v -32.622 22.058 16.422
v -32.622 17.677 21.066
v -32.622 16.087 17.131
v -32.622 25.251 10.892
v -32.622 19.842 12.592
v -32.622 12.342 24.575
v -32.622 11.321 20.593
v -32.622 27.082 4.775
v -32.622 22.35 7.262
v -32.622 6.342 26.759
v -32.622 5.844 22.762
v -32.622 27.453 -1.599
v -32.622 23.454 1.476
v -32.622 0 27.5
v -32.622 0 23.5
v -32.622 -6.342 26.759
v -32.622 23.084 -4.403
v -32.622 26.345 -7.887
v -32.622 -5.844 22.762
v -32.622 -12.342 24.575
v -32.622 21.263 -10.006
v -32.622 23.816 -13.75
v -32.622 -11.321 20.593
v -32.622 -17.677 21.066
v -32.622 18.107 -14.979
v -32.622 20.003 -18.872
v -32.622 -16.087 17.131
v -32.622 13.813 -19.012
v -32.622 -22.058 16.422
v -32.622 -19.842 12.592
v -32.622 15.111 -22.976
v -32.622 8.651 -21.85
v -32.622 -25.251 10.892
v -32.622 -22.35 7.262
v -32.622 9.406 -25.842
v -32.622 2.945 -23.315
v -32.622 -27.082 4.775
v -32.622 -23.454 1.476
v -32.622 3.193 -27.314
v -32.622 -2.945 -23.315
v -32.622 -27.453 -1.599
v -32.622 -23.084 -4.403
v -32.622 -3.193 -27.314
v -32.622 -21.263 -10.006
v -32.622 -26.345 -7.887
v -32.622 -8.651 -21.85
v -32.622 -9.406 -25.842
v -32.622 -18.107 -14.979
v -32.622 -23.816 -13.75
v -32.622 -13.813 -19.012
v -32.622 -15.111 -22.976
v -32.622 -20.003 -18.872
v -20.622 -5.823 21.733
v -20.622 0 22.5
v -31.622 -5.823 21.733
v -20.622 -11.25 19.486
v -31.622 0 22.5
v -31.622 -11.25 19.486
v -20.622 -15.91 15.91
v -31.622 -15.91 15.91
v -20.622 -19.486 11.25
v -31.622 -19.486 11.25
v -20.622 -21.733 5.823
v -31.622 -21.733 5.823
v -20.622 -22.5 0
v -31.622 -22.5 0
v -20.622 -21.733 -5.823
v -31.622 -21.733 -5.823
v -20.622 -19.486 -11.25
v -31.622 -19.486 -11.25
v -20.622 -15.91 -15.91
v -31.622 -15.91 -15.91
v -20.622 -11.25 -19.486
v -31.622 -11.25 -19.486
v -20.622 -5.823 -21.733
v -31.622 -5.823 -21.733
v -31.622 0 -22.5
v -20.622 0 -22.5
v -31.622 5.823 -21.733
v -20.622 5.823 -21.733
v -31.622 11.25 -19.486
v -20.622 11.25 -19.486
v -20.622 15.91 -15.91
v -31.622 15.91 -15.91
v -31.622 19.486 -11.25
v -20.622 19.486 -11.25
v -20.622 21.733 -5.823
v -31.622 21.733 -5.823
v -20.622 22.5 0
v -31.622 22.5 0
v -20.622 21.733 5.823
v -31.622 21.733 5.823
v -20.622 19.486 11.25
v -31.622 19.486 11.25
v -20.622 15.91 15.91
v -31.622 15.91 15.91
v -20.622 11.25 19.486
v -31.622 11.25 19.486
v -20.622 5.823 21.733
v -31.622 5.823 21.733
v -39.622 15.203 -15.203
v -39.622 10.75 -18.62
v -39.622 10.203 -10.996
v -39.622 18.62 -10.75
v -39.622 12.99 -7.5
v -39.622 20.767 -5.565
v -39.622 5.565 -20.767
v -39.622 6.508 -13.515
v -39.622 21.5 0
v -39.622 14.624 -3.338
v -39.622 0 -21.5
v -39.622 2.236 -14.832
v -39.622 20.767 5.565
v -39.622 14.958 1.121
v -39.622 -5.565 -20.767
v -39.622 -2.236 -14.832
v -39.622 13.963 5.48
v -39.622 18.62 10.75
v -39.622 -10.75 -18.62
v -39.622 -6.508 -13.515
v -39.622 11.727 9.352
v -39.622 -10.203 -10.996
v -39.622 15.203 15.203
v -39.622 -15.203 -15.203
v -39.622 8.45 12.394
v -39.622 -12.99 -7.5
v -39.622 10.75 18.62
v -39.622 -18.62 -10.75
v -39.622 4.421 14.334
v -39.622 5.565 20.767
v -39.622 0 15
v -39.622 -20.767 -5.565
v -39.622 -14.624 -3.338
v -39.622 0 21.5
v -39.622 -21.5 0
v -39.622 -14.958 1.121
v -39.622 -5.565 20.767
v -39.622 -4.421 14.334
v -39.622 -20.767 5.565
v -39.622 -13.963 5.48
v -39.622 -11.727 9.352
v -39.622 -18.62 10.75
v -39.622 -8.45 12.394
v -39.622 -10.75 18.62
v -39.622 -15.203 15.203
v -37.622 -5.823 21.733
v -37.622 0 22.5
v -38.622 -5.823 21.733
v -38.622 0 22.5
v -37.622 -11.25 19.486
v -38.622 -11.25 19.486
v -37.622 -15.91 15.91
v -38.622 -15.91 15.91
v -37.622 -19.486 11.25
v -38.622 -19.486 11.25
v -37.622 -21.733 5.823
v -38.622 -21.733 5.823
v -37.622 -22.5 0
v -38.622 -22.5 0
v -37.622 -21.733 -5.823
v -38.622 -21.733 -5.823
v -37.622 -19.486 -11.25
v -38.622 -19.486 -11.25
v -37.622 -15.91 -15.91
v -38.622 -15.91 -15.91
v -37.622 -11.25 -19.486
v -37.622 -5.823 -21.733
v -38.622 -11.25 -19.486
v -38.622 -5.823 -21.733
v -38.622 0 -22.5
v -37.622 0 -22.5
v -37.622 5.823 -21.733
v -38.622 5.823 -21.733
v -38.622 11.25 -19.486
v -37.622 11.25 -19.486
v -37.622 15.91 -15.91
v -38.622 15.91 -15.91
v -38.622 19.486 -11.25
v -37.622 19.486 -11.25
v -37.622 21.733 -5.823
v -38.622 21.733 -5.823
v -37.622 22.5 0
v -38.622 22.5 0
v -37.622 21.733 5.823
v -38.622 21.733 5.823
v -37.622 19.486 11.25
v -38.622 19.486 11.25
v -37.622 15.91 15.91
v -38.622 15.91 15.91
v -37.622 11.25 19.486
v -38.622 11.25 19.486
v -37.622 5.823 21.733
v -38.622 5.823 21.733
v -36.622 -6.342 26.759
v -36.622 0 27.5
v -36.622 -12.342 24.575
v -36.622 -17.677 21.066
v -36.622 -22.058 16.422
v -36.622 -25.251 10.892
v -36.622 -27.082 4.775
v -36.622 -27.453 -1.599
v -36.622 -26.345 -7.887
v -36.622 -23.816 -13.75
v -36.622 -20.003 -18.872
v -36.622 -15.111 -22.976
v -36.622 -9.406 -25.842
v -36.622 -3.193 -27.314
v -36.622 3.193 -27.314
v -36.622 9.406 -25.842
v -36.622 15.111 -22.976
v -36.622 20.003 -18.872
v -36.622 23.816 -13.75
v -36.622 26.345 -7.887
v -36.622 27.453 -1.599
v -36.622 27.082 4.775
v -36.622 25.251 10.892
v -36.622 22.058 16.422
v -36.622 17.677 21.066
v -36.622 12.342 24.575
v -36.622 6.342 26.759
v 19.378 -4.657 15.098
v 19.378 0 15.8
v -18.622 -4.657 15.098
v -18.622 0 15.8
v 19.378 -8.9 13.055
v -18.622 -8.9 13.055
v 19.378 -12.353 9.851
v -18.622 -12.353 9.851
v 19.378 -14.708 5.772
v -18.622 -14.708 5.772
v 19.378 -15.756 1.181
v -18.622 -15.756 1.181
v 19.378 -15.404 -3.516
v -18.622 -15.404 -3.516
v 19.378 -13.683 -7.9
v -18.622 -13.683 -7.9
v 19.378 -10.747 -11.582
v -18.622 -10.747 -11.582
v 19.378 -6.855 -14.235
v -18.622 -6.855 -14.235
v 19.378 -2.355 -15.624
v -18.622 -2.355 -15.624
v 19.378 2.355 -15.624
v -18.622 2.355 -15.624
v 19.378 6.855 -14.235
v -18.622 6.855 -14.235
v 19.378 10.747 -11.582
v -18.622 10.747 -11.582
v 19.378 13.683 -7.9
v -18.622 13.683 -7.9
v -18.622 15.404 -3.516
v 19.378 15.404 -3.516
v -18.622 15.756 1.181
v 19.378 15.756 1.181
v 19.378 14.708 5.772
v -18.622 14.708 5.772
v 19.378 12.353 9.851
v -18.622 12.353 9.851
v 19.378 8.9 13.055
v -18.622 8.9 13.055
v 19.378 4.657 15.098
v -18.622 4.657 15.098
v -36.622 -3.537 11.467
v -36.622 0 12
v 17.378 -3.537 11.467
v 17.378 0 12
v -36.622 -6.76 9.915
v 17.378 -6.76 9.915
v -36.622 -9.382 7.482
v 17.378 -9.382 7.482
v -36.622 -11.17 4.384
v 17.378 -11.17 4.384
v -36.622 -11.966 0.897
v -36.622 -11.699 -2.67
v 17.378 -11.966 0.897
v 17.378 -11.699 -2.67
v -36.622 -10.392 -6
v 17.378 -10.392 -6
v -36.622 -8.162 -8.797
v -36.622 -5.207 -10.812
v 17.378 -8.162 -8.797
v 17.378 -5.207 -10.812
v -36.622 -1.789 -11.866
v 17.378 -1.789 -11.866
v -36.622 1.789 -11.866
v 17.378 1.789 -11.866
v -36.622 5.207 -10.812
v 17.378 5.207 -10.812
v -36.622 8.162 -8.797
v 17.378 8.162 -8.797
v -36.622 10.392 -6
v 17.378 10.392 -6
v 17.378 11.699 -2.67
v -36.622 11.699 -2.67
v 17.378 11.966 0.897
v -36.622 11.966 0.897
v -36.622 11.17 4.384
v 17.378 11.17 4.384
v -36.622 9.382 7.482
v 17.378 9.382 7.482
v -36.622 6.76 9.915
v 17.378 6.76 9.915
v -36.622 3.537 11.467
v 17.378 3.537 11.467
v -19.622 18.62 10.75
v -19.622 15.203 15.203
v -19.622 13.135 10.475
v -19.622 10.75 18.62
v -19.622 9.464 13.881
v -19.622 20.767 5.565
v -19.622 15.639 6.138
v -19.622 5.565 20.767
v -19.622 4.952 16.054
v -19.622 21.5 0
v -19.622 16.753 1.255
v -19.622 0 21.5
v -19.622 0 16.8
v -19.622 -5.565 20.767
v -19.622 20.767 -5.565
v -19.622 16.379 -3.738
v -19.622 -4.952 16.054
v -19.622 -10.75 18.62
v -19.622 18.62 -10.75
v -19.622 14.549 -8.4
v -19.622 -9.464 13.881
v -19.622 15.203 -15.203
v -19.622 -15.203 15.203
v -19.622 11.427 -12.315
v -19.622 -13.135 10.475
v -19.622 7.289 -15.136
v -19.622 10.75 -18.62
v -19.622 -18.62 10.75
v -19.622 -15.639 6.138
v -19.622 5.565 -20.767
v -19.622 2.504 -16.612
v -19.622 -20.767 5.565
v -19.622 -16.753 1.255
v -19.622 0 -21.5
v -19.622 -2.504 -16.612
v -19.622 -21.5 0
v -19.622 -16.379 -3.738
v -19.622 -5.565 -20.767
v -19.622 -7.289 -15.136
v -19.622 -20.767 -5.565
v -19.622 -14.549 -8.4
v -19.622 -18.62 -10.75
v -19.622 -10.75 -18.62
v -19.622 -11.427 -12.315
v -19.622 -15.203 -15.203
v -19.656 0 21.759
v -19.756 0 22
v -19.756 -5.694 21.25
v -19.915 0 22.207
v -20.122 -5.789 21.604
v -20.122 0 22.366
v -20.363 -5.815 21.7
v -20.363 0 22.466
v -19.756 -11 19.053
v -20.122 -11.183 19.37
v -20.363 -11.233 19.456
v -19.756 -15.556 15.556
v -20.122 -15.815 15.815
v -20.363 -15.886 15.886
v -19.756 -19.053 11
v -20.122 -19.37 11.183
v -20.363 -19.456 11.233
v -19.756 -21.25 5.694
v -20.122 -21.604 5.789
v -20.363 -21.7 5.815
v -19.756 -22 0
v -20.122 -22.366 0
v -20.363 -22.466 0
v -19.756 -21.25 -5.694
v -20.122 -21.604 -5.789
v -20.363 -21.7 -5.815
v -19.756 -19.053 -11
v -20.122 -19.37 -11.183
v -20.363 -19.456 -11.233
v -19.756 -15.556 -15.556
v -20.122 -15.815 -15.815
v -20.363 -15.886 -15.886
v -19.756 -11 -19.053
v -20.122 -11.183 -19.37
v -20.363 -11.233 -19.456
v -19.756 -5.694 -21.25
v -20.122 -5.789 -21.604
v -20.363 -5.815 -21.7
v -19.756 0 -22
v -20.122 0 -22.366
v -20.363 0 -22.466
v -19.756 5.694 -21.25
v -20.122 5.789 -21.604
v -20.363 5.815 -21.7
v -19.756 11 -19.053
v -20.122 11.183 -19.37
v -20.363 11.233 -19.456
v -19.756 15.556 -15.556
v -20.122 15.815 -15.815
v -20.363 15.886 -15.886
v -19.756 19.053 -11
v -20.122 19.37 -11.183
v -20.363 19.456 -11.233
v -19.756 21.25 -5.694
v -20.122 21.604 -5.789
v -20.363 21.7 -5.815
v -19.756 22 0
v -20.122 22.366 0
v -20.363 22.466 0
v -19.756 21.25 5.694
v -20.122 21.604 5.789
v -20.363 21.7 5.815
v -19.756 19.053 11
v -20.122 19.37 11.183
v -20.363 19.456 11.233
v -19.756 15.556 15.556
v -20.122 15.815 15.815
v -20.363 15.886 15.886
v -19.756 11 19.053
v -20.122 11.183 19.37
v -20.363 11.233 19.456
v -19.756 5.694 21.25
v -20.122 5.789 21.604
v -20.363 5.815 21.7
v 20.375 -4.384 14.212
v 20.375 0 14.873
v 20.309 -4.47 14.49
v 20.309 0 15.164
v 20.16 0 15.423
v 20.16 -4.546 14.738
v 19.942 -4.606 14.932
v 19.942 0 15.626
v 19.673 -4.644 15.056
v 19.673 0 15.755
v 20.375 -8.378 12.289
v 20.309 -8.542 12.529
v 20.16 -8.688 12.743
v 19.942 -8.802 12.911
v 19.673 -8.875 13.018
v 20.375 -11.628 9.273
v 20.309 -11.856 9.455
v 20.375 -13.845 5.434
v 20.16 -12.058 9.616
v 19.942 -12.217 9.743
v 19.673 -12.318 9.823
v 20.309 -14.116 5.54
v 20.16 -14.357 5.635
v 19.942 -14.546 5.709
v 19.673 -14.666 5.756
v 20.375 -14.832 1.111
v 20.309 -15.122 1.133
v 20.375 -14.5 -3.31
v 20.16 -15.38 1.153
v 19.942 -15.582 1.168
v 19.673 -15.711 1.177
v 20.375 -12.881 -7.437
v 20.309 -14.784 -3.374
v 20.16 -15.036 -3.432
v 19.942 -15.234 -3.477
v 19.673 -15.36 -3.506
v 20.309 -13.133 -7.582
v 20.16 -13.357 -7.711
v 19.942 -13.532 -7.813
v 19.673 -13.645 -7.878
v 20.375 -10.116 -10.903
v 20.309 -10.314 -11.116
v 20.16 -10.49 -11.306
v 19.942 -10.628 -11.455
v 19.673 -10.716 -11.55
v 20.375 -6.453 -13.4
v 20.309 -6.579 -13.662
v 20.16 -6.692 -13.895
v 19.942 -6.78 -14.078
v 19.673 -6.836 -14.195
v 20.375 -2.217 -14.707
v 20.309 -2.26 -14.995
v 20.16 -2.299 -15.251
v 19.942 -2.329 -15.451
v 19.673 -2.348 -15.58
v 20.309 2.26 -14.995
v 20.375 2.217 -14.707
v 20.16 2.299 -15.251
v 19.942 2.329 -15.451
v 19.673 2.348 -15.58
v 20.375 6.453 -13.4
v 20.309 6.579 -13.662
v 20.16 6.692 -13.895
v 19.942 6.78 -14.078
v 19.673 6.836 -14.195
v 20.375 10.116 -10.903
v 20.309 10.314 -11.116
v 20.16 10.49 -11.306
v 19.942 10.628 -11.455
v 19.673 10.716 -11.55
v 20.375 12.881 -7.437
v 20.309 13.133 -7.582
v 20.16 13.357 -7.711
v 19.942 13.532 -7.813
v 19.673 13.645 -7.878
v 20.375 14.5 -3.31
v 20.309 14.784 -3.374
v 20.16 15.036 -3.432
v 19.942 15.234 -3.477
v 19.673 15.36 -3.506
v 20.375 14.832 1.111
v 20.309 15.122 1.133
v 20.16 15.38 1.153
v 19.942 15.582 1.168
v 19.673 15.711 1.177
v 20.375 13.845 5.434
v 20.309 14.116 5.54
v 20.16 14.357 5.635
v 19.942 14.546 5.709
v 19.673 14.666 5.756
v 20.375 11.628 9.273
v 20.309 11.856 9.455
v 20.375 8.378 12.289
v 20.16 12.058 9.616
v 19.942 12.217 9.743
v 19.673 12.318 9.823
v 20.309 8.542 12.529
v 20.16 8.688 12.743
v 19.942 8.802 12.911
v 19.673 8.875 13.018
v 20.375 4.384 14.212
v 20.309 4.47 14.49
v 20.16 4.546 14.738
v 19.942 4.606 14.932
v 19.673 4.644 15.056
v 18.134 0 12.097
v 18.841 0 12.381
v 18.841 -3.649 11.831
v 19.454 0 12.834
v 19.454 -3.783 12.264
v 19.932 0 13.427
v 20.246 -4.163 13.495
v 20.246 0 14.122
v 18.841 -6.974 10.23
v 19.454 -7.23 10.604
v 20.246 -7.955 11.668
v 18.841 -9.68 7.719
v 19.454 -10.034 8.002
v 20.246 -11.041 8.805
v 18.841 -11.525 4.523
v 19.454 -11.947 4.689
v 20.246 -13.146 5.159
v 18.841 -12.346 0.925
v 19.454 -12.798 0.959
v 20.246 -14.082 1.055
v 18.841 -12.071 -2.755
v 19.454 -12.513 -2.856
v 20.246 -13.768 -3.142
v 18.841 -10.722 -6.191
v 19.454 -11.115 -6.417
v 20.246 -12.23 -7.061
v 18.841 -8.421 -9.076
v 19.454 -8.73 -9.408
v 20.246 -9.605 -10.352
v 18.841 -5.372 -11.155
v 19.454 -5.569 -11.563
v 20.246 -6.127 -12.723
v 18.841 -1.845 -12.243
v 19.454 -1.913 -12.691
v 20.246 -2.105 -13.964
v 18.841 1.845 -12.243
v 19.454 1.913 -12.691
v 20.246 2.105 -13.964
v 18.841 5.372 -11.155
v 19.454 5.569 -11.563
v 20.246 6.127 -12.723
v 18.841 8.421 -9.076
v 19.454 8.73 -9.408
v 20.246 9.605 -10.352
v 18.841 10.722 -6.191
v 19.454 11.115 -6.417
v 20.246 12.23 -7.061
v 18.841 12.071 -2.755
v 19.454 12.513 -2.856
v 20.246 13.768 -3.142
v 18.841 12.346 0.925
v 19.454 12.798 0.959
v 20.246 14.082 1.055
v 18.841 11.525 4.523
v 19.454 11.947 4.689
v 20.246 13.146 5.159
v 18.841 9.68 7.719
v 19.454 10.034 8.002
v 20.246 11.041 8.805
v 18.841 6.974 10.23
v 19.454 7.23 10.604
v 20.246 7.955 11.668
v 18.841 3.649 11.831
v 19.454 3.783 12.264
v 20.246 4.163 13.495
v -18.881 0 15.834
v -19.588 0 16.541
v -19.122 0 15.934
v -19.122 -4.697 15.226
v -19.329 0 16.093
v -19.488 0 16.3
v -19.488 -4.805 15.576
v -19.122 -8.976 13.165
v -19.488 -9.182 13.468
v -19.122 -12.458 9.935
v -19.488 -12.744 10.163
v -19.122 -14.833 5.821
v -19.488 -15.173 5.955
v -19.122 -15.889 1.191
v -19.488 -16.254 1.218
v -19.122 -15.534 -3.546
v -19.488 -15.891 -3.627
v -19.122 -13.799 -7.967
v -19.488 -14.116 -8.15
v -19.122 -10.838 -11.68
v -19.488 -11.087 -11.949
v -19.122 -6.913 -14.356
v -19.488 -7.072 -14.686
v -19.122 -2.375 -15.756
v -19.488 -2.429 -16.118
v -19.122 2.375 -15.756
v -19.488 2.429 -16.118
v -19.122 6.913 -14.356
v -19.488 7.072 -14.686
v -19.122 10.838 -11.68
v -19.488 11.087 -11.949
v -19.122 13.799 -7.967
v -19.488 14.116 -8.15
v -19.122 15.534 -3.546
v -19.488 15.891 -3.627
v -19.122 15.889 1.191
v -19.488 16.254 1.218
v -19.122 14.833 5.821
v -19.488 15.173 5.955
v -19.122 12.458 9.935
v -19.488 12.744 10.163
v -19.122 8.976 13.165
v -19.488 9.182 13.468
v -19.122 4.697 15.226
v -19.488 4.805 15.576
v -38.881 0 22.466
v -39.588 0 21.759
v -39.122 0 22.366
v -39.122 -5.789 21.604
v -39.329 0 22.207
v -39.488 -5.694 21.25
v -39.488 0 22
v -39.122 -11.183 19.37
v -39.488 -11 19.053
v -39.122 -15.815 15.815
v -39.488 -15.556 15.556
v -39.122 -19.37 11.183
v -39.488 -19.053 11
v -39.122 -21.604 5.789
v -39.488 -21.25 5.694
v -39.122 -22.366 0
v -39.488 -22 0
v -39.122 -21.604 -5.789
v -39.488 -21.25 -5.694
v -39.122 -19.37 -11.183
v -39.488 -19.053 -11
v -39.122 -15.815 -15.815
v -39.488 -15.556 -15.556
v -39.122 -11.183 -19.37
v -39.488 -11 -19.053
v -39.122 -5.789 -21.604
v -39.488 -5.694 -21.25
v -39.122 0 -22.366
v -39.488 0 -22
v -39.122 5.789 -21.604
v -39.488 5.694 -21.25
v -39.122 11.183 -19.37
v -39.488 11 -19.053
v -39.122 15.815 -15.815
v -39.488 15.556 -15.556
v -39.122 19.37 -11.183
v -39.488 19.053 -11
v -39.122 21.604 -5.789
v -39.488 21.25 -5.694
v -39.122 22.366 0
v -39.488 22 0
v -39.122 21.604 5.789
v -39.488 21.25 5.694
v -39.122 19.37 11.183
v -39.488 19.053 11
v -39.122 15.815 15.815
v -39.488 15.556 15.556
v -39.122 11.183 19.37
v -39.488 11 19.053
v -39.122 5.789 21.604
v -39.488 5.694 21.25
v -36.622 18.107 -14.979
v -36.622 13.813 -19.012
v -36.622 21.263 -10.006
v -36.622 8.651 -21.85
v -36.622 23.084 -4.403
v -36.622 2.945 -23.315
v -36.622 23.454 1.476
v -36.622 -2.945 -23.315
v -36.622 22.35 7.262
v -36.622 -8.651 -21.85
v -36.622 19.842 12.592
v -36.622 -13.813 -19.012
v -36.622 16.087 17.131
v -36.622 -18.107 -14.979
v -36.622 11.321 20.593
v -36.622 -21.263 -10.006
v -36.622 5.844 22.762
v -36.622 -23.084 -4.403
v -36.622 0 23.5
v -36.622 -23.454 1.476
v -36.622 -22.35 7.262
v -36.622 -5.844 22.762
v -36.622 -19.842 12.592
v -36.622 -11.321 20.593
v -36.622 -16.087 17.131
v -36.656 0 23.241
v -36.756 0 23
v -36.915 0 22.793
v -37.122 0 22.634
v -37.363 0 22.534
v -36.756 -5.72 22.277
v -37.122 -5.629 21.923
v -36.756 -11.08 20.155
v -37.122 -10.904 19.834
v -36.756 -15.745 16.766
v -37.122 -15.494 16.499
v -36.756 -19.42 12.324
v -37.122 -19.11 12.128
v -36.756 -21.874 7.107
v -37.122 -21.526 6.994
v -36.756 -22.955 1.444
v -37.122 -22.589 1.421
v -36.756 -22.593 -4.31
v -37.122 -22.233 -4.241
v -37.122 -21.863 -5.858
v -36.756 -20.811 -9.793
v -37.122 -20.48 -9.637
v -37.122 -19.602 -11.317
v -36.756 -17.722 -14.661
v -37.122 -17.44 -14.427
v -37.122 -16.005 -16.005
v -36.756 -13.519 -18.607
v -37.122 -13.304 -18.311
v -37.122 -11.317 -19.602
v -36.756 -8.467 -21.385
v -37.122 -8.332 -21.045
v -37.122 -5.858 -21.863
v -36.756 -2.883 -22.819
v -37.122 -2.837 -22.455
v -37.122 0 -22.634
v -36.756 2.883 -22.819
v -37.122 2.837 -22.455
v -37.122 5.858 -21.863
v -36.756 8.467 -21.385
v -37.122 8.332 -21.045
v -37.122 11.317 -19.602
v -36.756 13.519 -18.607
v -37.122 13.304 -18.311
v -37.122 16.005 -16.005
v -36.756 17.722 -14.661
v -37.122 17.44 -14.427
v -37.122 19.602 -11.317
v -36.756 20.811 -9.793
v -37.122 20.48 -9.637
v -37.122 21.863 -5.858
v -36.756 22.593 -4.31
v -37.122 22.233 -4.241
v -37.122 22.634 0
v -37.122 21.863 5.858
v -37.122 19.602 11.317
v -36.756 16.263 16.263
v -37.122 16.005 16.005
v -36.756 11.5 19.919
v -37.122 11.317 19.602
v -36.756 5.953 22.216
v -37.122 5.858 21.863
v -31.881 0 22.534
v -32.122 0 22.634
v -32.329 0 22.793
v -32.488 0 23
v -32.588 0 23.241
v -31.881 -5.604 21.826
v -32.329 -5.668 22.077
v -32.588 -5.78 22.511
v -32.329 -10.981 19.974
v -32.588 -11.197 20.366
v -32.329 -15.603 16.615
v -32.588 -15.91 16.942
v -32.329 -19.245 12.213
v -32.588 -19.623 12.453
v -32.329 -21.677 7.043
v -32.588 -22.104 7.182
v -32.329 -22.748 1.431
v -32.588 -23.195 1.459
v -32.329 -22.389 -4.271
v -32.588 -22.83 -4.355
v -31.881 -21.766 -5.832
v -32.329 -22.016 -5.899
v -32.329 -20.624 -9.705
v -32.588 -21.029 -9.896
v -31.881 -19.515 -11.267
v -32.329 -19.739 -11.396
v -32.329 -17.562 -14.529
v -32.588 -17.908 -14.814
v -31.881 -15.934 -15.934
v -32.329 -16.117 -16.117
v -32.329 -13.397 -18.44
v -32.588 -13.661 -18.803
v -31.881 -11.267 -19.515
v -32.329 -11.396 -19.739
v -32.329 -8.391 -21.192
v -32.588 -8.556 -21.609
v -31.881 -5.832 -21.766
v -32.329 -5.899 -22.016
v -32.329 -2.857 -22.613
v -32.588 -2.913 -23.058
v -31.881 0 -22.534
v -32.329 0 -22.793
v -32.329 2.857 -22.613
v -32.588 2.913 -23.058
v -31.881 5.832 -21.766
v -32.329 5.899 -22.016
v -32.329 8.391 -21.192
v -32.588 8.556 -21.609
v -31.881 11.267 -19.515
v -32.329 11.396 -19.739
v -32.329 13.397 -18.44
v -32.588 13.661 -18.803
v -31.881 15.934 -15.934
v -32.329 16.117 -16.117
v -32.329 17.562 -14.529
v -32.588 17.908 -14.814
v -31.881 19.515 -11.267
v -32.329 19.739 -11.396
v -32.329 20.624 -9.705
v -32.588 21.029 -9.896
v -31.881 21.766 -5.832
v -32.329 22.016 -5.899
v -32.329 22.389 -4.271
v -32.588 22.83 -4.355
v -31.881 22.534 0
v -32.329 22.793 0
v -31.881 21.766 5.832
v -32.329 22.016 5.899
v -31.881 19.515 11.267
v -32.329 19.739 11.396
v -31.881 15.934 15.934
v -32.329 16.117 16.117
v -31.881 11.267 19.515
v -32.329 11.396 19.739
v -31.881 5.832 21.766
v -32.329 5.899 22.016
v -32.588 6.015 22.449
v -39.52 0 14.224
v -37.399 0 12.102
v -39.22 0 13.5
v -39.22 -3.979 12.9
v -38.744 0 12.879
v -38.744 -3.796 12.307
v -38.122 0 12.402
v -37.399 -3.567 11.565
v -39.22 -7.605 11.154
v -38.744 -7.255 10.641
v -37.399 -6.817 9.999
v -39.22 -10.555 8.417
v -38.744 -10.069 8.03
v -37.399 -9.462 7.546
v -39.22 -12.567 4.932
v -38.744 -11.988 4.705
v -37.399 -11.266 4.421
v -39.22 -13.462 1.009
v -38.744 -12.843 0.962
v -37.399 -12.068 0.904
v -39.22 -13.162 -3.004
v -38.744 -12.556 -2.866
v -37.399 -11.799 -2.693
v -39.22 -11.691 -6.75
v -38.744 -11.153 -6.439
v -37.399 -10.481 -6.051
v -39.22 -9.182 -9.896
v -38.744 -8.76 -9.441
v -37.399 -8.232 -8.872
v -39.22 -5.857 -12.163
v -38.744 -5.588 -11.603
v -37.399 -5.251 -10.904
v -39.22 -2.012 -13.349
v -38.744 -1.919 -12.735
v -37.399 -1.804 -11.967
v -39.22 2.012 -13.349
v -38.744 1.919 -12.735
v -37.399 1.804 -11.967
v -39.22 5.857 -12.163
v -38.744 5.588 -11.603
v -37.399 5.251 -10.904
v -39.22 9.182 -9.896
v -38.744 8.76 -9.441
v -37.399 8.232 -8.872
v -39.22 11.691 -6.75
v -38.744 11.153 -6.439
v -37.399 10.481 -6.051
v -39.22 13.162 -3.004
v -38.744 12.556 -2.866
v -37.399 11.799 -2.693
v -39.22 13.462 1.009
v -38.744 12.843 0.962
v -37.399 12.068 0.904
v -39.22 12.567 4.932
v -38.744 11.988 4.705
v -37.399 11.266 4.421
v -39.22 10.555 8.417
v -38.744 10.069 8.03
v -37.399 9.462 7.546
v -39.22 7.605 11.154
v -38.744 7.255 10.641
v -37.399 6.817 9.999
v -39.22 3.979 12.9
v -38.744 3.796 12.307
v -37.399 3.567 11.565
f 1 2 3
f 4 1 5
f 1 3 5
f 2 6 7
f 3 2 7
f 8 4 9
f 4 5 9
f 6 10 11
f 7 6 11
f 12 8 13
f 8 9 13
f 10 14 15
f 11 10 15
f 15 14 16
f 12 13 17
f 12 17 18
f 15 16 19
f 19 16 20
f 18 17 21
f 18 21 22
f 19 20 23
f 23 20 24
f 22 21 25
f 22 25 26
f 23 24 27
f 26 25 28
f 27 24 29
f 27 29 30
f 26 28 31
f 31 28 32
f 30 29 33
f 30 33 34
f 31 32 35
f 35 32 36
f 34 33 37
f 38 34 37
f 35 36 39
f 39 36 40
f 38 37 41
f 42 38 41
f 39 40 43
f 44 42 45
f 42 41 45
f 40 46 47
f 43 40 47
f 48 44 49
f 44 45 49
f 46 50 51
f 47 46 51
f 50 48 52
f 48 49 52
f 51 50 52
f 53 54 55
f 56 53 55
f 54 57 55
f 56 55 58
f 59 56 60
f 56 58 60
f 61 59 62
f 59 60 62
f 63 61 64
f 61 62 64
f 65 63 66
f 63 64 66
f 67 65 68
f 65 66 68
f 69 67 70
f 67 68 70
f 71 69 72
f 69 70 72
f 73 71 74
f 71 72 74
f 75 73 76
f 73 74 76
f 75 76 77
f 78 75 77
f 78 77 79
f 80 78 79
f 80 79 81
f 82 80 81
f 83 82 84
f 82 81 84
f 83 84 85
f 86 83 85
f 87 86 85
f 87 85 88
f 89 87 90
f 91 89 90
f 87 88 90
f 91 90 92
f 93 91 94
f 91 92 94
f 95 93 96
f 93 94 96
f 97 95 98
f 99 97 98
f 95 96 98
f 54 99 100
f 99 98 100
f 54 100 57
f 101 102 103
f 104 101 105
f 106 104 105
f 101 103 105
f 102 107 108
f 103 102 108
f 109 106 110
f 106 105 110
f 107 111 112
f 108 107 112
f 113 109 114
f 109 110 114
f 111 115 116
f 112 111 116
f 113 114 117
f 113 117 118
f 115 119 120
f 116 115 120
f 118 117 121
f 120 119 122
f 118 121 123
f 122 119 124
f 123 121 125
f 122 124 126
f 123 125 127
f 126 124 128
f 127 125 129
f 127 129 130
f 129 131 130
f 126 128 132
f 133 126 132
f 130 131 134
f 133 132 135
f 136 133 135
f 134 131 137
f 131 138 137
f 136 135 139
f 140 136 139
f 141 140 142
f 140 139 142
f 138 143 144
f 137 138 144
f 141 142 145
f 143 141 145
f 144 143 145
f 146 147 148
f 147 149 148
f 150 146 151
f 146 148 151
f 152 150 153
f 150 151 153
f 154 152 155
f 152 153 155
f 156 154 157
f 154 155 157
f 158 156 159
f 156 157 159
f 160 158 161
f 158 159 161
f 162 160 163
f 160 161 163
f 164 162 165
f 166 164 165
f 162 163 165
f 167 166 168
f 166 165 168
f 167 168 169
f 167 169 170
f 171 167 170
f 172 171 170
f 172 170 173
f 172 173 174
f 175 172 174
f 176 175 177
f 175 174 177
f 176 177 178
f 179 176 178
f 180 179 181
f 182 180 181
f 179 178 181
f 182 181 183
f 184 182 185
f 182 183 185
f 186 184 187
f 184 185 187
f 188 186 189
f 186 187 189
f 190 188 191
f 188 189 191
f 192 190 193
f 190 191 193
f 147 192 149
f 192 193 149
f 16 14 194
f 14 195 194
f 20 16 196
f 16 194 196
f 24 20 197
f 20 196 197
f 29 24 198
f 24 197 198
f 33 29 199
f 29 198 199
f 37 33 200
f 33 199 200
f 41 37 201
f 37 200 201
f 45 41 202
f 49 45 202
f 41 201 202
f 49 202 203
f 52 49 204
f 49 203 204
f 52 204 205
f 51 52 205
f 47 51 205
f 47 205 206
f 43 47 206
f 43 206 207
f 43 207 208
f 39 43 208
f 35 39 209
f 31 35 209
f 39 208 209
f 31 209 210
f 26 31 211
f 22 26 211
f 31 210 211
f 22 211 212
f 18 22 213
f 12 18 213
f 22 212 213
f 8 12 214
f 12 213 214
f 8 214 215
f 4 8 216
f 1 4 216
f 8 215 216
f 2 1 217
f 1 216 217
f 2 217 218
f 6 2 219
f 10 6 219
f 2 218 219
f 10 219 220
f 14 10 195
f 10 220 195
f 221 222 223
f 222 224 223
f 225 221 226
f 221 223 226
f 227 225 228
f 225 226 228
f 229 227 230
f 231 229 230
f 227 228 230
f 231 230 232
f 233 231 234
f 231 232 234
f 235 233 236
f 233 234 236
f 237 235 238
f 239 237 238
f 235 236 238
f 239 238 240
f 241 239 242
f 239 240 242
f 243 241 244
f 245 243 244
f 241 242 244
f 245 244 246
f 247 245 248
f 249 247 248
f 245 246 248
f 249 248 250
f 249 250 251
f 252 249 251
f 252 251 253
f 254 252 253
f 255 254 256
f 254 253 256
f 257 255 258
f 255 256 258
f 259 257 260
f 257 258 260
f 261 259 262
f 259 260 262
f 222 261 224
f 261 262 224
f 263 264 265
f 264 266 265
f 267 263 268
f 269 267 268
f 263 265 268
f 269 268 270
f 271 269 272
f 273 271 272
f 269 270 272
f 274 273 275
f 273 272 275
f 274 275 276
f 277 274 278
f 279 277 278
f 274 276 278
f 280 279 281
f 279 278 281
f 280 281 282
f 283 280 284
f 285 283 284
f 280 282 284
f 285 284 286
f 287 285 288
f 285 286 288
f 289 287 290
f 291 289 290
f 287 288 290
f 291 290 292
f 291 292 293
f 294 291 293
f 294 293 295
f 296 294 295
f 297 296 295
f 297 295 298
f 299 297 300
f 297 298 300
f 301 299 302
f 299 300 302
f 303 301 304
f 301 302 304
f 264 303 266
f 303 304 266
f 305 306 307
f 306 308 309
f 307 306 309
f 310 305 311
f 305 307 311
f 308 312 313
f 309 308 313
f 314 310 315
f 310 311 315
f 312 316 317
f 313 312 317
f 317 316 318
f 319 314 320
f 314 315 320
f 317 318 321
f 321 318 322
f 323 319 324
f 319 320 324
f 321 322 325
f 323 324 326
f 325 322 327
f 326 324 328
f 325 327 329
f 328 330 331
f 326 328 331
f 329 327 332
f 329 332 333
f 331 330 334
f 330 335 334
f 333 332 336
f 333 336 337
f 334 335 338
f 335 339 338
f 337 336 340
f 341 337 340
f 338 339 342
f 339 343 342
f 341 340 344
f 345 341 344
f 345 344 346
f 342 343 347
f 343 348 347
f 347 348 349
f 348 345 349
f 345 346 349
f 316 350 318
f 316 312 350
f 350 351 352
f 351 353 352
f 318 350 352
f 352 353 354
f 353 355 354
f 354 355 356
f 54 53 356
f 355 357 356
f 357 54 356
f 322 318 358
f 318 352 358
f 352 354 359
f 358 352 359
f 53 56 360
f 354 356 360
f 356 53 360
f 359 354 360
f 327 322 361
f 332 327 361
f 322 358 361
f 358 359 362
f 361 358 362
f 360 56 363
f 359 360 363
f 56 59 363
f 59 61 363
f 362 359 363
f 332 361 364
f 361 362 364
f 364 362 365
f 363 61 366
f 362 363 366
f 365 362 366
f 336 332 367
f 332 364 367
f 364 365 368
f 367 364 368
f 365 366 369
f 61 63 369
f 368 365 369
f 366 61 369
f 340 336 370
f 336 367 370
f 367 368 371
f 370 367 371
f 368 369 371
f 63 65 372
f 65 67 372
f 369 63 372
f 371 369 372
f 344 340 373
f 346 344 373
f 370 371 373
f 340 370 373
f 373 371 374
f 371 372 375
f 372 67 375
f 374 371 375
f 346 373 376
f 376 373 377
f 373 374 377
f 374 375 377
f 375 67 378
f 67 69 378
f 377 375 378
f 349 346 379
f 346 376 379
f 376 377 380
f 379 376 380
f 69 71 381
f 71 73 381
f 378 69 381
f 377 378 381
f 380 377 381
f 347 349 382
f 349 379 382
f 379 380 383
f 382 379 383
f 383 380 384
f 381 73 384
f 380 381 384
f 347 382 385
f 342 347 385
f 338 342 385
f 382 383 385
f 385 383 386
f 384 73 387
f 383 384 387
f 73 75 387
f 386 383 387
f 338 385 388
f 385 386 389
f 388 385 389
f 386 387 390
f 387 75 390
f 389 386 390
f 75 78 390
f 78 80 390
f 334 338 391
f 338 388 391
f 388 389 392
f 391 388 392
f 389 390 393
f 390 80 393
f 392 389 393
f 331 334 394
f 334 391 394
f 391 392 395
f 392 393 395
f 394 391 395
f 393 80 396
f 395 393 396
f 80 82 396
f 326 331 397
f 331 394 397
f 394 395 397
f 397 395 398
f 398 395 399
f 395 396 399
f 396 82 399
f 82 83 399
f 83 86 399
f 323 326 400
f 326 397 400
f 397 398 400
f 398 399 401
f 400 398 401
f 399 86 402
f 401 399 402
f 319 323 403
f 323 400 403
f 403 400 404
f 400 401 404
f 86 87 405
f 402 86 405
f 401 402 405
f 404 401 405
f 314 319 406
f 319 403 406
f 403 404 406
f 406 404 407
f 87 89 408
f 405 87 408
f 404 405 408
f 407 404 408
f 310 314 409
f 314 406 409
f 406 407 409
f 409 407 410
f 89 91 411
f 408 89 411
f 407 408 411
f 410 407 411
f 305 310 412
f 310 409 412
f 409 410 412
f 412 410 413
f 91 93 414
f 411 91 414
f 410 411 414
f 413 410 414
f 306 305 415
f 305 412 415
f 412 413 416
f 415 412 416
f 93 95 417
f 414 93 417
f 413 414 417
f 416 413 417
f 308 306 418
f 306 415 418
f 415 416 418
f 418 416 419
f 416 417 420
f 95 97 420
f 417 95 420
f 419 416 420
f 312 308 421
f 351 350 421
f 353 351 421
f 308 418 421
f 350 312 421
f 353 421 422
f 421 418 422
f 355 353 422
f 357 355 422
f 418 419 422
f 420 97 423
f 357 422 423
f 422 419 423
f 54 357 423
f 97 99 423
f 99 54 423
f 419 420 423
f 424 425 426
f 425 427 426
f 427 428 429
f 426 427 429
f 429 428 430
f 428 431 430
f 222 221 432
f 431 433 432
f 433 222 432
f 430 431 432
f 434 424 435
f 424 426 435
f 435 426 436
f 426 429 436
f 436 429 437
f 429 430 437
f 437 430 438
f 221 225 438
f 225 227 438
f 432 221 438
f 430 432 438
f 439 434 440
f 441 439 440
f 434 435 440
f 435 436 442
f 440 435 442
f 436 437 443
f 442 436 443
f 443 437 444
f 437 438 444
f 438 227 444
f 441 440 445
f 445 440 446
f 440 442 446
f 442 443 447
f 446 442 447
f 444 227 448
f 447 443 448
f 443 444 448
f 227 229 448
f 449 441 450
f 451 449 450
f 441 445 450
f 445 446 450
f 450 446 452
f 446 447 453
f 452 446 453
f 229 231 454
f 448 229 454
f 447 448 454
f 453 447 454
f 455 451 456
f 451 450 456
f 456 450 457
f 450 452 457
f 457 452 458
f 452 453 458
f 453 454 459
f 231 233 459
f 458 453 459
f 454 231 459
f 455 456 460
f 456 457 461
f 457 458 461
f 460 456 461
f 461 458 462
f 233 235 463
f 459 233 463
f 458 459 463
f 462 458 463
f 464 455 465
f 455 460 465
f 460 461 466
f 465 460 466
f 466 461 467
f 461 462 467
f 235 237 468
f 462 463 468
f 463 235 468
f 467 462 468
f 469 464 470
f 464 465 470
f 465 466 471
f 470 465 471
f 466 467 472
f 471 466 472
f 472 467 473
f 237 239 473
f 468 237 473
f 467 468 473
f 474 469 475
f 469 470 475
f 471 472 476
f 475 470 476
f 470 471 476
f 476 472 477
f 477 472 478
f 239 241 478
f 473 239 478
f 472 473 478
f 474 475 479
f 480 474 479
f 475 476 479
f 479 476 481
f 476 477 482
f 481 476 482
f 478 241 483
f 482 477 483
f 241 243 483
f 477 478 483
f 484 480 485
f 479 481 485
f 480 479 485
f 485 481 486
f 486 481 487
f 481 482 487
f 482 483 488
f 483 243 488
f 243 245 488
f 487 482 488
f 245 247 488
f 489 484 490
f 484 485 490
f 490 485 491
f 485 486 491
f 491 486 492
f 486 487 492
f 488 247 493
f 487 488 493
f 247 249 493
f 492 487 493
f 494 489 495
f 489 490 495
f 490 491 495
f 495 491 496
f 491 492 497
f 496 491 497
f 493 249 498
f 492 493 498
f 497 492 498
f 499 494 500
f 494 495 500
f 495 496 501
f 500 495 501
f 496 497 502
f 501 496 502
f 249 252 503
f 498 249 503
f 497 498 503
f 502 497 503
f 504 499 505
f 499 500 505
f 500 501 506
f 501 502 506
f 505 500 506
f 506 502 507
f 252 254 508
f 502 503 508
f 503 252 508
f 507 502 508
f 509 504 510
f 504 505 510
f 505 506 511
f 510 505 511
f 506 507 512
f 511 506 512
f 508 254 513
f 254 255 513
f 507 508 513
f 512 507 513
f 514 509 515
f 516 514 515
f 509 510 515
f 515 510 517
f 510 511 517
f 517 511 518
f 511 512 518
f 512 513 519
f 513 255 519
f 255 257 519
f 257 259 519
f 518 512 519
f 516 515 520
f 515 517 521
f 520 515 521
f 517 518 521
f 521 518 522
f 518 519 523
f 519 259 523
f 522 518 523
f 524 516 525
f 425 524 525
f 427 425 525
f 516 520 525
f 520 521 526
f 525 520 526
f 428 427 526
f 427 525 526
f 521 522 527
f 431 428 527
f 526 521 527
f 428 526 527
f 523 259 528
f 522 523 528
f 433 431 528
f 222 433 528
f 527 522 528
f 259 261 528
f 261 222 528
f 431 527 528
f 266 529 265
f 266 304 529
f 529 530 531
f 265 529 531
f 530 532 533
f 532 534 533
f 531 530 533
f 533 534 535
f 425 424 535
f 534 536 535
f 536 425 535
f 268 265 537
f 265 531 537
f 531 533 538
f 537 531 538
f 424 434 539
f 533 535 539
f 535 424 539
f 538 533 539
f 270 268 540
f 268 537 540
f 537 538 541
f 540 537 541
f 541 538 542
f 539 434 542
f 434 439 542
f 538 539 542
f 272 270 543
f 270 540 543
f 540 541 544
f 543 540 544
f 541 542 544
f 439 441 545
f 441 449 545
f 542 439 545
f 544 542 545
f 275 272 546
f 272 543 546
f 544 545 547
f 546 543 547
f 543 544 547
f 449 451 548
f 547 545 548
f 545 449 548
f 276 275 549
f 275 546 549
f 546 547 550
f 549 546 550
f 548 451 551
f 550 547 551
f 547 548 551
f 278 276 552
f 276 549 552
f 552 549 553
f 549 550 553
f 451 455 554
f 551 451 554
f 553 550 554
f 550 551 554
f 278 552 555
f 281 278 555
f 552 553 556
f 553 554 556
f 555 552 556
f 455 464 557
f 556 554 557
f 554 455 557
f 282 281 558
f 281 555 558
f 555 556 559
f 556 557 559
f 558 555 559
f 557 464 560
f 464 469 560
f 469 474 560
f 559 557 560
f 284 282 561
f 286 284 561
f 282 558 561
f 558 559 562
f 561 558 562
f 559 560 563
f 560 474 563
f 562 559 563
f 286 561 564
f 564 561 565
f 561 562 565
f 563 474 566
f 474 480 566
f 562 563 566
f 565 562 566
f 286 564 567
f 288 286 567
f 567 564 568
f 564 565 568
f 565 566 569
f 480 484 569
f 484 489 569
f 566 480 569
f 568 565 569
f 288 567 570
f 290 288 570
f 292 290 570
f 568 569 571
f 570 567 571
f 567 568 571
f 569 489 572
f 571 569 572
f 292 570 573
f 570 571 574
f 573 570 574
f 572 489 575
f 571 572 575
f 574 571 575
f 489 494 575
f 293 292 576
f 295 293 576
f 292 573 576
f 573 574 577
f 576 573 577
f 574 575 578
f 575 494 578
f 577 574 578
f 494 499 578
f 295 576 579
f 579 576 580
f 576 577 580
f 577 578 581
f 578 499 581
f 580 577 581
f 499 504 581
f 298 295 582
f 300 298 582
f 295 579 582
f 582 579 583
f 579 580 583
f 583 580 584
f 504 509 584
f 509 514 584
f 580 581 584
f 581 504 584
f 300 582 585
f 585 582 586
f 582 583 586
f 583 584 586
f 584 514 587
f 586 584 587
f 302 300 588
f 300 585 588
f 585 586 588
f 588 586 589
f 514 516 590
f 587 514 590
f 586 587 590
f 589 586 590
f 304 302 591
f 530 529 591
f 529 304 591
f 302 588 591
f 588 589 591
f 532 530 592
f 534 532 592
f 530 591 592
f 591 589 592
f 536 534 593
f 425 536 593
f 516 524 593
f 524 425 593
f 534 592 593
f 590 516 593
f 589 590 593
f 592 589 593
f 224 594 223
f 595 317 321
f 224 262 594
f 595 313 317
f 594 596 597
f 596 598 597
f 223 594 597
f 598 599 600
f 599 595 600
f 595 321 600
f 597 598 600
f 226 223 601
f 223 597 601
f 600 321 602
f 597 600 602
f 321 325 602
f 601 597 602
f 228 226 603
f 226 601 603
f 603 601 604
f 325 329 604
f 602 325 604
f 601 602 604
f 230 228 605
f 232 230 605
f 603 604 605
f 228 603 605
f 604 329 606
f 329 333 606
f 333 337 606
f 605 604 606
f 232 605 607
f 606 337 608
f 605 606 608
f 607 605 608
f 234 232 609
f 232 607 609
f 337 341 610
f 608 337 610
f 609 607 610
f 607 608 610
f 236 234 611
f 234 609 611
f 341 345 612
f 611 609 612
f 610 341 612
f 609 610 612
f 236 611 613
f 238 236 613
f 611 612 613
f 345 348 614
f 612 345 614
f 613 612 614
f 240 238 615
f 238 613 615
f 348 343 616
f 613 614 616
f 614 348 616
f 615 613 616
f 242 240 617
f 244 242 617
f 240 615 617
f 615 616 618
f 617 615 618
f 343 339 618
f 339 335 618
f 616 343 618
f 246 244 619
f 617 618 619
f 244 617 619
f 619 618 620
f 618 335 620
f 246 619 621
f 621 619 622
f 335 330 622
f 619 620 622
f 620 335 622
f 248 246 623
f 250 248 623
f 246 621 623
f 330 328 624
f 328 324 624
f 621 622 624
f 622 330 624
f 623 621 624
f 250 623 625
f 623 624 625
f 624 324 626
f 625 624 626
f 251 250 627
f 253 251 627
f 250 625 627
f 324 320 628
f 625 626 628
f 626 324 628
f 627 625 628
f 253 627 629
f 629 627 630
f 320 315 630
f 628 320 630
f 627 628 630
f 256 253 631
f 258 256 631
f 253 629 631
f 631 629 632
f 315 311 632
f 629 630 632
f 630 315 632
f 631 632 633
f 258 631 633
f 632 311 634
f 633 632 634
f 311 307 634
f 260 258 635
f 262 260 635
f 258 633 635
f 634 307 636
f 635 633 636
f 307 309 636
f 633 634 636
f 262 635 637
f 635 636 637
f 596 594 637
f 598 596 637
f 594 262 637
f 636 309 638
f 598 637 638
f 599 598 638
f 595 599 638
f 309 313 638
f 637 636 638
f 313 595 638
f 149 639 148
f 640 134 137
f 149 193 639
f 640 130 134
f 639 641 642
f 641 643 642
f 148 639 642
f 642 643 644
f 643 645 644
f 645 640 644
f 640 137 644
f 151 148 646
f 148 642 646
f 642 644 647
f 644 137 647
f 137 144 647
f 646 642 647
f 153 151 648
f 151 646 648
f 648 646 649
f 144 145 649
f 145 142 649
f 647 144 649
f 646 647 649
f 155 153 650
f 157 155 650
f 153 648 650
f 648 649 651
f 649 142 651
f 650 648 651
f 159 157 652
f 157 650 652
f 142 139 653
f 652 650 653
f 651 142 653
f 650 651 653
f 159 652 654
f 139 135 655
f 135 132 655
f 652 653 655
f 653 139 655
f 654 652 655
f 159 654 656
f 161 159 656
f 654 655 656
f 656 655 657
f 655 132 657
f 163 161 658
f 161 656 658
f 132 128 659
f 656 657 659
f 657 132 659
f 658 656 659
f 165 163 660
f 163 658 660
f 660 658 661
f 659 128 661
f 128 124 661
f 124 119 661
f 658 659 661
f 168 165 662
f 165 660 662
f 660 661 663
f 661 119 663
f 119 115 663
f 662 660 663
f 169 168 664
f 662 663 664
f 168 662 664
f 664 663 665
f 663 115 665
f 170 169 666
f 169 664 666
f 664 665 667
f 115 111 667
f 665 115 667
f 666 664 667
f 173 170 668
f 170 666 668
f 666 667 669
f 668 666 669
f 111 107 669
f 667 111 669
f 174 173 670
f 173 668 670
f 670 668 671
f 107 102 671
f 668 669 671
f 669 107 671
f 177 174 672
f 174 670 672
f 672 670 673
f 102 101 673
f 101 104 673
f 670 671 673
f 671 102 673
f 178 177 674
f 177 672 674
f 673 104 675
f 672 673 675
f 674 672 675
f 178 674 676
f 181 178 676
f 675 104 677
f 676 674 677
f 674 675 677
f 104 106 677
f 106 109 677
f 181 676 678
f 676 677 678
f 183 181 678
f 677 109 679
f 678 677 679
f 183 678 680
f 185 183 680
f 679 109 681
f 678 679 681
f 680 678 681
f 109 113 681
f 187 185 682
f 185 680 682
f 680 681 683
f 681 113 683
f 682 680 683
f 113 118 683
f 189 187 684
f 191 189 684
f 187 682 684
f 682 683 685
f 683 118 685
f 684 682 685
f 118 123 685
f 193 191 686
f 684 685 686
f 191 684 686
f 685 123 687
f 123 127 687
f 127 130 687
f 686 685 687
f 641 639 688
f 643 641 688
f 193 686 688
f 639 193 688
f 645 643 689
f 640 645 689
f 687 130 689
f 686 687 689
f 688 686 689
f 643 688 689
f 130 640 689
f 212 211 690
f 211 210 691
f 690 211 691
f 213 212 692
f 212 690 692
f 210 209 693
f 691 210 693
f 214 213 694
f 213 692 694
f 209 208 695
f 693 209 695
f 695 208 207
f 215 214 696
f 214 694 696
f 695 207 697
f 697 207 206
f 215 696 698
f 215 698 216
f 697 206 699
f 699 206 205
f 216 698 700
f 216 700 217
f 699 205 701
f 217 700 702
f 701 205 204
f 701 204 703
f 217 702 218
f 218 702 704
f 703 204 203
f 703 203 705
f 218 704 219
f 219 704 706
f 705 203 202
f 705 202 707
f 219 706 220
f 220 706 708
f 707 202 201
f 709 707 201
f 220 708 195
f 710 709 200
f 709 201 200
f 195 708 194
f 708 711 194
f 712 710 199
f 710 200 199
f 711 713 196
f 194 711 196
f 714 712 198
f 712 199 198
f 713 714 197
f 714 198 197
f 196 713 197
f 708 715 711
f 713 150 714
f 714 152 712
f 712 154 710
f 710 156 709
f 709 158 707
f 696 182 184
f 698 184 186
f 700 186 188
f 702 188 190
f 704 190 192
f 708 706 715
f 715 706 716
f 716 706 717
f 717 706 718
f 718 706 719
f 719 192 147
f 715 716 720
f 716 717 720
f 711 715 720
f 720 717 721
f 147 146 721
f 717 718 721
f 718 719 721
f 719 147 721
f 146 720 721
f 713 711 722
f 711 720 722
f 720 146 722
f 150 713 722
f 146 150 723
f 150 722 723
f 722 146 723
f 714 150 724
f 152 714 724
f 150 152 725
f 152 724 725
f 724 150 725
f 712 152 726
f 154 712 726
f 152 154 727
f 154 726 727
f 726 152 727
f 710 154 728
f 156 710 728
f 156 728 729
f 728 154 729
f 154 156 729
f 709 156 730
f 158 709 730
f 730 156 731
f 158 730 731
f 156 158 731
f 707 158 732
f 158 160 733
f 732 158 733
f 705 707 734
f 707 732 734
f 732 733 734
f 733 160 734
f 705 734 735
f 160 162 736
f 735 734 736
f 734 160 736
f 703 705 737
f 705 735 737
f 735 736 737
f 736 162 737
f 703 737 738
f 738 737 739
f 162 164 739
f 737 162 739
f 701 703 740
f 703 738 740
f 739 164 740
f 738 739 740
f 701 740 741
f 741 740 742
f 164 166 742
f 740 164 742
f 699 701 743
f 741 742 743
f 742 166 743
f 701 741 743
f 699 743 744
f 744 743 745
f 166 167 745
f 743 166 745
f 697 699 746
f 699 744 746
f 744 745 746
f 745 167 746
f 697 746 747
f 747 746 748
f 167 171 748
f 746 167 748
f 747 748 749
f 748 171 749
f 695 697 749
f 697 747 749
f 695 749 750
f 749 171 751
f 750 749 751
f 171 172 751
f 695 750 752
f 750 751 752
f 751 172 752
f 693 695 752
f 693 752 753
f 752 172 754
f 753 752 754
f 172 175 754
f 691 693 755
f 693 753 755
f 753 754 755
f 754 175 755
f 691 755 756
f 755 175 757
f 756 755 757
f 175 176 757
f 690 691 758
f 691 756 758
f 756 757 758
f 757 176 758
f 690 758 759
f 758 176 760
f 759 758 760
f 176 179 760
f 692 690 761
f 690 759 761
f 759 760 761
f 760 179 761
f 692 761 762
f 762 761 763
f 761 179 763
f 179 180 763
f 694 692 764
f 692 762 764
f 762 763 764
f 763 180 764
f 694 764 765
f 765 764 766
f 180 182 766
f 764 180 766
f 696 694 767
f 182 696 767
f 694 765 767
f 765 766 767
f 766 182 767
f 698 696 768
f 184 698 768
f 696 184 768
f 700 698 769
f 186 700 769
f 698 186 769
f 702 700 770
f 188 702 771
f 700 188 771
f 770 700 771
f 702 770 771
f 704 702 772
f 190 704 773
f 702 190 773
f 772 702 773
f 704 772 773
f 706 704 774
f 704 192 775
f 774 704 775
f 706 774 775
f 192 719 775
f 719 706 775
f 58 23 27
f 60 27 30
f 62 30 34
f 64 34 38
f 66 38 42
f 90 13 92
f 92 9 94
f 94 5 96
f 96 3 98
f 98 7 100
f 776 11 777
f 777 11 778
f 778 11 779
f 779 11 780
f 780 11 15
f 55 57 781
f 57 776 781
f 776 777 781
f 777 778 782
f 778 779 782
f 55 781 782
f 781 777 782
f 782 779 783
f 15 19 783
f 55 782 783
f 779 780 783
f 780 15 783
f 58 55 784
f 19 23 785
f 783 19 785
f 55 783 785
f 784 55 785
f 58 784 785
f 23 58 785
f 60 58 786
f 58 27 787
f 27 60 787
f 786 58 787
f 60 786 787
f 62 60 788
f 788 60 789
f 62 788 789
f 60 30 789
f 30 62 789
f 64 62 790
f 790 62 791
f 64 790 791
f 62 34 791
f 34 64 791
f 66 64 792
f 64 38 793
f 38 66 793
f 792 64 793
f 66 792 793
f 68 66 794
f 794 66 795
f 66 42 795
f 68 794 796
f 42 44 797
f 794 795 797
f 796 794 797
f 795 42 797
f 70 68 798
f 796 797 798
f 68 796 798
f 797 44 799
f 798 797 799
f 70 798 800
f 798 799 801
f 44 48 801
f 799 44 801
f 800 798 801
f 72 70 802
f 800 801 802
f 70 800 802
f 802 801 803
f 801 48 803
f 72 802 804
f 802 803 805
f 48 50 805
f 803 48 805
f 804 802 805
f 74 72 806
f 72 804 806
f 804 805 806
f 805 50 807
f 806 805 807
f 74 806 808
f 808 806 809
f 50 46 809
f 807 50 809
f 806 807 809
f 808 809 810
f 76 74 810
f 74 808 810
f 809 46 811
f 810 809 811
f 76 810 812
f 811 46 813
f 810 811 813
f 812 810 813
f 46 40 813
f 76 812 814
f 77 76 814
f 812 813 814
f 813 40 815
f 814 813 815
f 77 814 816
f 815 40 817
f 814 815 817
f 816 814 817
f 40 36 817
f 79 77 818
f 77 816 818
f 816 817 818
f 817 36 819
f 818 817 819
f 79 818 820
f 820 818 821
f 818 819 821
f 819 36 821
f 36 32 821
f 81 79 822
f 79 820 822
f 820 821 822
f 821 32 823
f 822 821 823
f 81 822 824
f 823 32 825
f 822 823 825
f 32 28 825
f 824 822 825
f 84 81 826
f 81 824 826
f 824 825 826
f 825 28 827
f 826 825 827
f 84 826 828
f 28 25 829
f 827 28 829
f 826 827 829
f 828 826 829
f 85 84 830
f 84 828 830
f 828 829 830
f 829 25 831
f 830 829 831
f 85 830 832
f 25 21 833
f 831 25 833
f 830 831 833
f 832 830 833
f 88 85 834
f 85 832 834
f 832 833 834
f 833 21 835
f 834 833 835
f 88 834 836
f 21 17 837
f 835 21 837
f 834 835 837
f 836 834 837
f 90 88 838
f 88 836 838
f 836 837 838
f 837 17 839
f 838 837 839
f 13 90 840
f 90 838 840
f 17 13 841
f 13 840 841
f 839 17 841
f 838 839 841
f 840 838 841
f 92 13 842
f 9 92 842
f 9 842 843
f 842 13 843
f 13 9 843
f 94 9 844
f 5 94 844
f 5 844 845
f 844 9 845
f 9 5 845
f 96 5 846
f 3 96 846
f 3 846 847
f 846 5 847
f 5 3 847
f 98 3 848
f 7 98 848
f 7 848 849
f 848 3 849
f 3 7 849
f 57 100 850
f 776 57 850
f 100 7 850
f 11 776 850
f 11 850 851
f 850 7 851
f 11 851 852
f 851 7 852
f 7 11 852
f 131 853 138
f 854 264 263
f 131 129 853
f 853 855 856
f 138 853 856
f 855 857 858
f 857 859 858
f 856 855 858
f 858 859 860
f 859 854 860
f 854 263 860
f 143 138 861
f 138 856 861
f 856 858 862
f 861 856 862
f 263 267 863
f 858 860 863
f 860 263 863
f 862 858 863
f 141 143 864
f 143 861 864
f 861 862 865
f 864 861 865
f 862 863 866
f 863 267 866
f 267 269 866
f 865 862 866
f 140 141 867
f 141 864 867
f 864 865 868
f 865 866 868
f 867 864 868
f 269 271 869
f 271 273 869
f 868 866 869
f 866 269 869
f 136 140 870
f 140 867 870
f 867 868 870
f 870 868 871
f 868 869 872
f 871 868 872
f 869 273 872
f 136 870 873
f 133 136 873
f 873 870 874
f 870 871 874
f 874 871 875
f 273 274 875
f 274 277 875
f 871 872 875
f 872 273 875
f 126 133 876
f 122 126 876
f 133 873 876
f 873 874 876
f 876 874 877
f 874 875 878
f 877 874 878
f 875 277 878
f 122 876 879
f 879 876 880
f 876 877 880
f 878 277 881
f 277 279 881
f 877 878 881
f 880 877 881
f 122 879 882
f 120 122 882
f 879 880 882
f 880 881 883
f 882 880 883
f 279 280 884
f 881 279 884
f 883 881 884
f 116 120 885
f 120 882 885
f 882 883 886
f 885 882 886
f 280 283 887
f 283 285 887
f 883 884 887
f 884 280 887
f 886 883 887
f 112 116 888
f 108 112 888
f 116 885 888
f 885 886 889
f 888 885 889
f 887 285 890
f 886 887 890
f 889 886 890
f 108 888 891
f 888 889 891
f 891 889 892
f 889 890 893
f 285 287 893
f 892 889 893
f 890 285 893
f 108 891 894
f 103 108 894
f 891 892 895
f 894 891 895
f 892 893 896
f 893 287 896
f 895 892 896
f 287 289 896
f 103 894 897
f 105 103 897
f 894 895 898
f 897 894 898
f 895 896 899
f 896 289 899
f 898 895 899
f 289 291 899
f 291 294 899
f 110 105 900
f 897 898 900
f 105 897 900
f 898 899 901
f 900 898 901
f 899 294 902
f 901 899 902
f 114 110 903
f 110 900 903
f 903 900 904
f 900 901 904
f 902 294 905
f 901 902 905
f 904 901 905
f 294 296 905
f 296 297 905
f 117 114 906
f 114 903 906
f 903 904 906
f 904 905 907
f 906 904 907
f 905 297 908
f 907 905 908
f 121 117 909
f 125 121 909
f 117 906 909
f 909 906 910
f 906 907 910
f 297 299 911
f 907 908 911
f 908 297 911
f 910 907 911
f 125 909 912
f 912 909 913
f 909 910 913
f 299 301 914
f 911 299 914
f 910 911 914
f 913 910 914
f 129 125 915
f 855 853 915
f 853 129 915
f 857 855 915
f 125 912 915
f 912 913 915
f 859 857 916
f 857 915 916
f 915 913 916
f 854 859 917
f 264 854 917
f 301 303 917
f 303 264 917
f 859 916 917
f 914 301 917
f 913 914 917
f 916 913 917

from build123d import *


with BuildPart() as f1:
    # F0 (on Front) → F1 (revolve)
    with BuildSketch(Plane.XZ):
        with BuildLine():
            ThreePointArc((20.3776905551, 15), (20.3770200882, 14.9365779866), (20.3750089872, 14.8731843214))
            ThreePointArc((20.3750089872, 14.8731843214), (20.3770199383, 14.8366167165), (20.3776905551, 14.8))
            Line((20.3776905551, 14.8), (20.3776905551, 15))
        make_face()
    revolve(axis=Axis((-2.0623714099, 0, 0), (1, 0, 0)))


with BuildPart() as f1b:
    # F0 (on Front) → F1, piece 2 (revolve)
    with BuildSketch(Plane.XZ):
        with BuildLine():
            Line((-39.6223094449, 21.5), (-39.6223094449, 15))
            ThreePointArc((-39.6223094449, 15), (-38.7436297885, 12.8786796564), (-36.6223094449, 12))
            Line((-36.6223094449, 12), (17.3776905551, 12))
            ThreePointArc((17.3776905551, 12), (19.4536906712, 12.8343076124), (20.3750089872, 14.8731843214))
            ThreePointArc((20.3750089872, 14.8731843214), (20.05843121, 15.532524512), (19.3776905551, 15.8))
            Line((19.3776905551, 15.8), (-18.6223094449, 15.8))
            ThreePointArc((-18.6223094449, 15.8), (-19.3294162261, 16.0928932188), (-19.6223094449, 16.8))
            Line((-19.6223094449, 16.8), (-19.6223094449, 21.5))
            ThreePointArc((-19.6223094449, 21.5), (-19.9152026637, 22.2071067812), (-20.6223094449, 22.5))
            Line((-20.6223094449, 22.5), (-31.6223094449, 22.5))
            ThreePointArc((-31.6223094449, 22.5), (-32.3294162261, 22.7928932188), (-32.6223094449, 23.5))
            Line((-32.6223094449, 23.5), (-32.6223094449, 27.5))
            Line((-32.6223094449, 27.5), (-36.6223094449, 27.5))
            Line((-36.6223094449, 27.5), (-36.6223094449, 23.5))
            ThreePointArc((-36.6223094449, 23.5), (-36.9152026637, 22.7928932188), (-37.6223094449, 22.5))
            Line((-37.6223094449, 22.5), (-38.6223094449, 22.5))
            ThreePointArc((-38.6223094449, 22.5), (-39.3294162261, 22.2071067812), (-39.6223094449, 21.5))
        make_face()
    revolve(axis=Axis((-2.0623714099, 0, 0), (1, 0, 0)))


solid = f1b.part
